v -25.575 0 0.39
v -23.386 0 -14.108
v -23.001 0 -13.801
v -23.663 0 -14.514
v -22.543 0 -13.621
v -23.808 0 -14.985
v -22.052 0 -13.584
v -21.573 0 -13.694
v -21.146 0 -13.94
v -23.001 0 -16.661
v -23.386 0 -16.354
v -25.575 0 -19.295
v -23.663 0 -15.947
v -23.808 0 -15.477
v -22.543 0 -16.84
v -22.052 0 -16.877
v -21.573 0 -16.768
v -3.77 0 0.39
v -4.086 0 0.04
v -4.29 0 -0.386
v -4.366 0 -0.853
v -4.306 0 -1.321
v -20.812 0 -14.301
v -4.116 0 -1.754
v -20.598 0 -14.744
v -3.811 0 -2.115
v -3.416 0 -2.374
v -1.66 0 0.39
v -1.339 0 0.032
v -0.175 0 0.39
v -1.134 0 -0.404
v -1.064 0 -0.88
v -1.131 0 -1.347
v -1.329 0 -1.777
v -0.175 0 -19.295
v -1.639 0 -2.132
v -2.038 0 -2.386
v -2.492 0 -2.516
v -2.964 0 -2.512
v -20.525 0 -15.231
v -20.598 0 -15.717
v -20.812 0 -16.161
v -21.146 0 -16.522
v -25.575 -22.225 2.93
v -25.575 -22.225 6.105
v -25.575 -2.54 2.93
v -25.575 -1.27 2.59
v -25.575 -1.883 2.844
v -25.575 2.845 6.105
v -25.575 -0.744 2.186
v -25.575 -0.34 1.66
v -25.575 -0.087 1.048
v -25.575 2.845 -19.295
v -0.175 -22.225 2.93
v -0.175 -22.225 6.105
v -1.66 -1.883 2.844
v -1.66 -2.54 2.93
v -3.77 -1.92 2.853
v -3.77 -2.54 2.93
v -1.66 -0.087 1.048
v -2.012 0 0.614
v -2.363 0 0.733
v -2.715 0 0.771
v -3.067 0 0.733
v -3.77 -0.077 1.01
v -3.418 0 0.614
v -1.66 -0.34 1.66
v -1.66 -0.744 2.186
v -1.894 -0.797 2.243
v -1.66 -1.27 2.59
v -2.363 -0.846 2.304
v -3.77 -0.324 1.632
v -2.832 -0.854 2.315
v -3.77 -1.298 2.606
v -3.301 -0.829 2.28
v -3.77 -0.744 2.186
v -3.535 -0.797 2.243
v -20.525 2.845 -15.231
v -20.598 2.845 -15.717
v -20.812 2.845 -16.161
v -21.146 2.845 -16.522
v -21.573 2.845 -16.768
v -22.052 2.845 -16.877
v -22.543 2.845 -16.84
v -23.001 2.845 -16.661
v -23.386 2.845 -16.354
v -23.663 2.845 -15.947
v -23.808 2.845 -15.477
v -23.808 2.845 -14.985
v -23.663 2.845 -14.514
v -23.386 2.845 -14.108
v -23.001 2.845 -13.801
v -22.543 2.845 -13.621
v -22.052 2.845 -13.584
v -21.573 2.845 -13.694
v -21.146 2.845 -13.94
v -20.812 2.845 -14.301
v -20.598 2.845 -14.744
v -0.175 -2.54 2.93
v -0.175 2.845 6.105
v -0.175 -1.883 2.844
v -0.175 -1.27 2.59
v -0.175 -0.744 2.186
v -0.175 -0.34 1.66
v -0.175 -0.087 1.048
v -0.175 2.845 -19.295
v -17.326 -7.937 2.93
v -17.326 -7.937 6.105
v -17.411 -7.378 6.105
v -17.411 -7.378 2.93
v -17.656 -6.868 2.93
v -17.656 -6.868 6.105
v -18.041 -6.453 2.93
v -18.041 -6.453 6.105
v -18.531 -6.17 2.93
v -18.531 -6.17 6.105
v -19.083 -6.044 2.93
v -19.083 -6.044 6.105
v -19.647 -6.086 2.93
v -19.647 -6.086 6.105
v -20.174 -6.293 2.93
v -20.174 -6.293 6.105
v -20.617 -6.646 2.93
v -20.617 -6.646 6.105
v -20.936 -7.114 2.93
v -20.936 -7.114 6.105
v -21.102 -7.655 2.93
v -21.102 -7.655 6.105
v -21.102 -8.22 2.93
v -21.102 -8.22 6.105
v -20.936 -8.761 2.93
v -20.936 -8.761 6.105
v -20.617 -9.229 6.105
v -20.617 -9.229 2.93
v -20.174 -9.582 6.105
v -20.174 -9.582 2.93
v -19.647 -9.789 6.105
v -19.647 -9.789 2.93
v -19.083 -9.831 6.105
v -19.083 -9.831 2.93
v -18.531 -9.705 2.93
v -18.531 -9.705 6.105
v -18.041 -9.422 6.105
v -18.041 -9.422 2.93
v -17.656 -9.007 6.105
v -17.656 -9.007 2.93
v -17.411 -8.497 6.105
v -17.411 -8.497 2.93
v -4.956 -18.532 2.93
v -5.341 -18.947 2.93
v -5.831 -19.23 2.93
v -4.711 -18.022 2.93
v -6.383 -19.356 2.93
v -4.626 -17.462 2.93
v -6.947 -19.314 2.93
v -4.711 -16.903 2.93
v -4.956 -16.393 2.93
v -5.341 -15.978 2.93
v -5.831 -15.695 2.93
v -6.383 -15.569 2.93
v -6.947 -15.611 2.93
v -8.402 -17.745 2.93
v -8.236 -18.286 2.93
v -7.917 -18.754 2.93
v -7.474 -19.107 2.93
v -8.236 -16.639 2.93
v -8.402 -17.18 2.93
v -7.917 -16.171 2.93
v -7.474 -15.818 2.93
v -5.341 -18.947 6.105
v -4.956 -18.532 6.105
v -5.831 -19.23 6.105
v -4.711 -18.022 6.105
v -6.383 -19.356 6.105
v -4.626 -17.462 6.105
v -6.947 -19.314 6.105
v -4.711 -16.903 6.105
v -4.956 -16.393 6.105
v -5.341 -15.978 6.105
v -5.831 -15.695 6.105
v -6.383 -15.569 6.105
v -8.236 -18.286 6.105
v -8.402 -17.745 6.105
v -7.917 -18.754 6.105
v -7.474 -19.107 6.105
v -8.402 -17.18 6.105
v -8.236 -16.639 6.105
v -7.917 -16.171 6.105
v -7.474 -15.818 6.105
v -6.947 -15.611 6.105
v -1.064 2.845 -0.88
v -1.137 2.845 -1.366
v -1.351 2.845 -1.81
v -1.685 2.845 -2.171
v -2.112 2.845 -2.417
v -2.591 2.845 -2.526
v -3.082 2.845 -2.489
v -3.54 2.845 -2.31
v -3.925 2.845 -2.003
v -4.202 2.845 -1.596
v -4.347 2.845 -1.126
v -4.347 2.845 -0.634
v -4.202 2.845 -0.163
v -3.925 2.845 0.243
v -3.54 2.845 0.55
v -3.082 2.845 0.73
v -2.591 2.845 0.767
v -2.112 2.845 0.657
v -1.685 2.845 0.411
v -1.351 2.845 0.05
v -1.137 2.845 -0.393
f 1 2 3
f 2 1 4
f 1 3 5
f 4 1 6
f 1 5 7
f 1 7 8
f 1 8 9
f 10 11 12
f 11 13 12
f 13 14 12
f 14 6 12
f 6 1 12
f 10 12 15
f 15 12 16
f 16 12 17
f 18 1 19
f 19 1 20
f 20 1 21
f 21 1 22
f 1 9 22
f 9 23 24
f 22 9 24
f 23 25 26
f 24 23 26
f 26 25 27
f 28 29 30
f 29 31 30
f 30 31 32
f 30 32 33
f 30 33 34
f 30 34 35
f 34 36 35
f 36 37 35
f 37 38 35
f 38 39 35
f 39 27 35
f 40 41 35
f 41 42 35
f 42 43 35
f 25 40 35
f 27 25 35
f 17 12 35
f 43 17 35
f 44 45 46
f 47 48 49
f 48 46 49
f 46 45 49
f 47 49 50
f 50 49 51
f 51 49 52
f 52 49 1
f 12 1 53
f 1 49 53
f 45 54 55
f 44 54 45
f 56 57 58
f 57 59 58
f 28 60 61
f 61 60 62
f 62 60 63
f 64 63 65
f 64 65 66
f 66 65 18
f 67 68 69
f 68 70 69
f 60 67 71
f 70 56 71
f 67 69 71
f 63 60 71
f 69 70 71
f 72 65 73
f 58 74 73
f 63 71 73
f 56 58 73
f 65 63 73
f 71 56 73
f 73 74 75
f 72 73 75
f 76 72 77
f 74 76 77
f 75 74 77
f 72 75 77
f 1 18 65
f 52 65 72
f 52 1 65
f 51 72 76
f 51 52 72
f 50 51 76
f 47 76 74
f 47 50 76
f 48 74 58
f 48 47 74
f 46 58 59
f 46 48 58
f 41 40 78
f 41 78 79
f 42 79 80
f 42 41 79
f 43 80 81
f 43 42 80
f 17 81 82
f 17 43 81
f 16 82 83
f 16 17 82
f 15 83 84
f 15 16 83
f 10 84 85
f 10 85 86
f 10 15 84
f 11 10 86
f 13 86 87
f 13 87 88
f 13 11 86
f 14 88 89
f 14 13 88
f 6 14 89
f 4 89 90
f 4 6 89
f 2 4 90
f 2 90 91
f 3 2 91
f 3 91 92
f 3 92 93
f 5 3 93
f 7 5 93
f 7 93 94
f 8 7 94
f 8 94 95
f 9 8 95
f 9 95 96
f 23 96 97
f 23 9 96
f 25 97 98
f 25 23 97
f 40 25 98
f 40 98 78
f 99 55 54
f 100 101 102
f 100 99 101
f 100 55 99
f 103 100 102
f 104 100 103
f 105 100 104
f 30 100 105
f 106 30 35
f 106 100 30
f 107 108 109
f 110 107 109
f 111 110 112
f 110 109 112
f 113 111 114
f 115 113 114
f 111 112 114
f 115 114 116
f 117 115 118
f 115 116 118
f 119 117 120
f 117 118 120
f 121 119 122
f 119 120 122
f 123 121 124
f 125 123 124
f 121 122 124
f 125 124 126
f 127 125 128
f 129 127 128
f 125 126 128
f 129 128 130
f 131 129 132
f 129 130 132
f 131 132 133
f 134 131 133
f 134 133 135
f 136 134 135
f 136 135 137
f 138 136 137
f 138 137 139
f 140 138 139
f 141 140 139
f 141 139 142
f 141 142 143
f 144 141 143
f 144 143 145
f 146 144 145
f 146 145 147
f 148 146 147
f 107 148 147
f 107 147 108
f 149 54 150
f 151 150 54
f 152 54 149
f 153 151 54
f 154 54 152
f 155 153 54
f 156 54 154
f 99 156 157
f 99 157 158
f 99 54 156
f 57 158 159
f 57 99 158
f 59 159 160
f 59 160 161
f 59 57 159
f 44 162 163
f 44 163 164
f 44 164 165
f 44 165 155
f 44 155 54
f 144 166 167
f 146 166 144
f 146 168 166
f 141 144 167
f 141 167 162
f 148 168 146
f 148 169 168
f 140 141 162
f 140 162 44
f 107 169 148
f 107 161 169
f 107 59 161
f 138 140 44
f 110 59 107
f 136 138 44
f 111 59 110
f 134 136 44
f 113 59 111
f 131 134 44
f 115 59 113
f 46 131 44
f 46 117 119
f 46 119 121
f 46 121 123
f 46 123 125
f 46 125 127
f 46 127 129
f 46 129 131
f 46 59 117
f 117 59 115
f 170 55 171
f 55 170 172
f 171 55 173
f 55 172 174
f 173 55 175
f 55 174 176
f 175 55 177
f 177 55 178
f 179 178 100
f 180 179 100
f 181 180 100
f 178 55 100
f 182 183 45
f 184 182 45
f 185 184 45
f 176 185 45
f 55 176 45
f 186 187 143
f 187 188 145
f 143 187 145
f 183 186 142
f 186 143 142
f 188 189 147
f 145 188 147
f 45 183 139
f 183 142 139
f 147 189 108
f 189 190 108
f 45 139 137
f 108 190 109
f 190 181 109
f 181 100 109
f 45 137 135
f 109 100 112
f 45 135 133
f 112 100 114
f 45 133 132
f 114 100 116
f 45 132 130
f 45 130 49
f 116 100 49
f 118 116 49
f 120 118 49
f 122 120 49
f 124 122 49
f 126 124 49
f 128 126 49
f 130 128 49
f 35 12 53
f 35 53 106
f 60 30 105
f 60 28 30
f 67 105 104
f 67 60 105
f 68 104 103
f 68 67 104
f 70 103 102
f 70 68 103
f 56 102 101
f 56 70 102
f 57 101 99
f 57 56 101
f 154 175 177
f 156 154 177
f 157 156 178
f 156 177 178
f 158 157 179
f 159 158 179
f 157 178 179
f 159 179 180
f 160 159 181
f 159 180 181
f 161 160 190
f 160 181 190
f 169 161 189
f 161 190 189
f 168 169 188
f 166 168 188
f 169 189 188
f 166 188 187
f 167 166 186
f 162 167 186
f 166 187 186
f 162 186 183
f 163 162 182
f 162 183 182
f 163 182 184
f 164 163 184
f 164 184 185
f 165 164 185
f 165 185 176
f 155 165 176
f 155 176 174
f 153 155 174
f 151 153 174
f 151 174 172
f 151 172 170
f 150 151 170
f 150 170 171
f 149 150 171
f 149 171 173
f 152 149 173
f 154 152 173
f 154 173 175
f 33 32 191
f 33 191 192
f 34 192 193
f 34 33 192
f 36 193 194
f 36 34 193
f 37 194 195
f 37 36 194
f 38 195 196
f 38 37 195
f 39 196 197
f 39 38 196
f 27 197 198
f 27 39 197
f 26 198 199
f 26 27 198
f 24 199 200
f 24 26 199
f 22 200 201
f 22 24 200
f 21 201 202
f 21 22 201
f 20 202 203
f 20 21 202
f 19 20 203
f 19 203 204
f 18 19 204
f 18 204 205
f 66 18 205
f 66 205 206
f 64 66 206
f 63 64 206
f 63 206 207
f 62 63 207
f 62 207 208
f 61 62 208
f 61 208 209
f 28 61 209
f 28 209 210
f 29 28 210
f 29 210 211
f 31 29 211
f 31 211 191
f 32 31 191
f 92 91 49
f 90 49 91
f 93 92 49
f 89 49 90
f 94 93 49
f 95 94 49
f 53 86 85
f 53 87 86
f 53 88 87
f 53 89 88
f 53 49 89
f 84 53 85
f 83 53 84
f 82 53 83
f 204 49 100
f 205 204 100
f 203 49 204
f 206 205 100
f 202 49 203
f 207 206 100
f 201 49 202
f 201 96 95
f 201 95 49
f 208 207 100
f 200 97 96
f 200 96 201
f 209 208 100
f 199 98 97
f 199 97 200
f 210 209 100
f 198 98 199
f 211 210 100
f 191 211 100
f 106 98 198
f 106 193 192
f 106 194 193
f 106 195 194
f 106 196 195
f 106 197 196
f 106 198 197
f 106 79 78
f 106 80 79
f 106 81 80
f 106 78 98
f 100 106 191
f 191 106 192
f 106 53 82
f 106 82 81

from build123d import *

# Parameters (mm, degrees)
SKETCH2_W                 = 25.4
SKETCH2_H                 = 25.4
SKETCH2_R                 = 1.651
BOSS_EXTRUDE1_DEPTH       = 2.8448
SKETCH3_W                 = 25.4
SKETCH3_H                 = 3.175
BOSS_EXTRUDE2_DEPTH       = 22.225
FILLET1_R                 = 2.54
F_6_CLEARANCE_HOLE1_D     = 3.7973
F_6_CLEARANCE_HOLE1_DEPTH = 12.7
F_6_CLEARANCE_HOLE1_TIP   = 1.140824014


with BuildPart() as part:
    # Sketch2 → Boss-Extrude1 (new body)
    with BuildSketch(Plane(origin=(0, 0, 0), x_dir=(1, 0, 0), z_dir=(0, 1, 0))):
        with Locations((-12.874879011, 6.594776819)):
            Rectangle(SKETCH2_W, SKETCH2_H)
        with Locations((-22.175738421, 15.230776819)):
            Circle(SKETCH2_R, mode=Mode.SUBTRACT)
        with Locations((-2.714879011, 0.879776819)):
            Circle(SKETCH2_R, mode=Mode.SUBTRACT)
    extrude(amount=BOSS_EXTRUDE1_DEPTH)

    # Sketch3 → Boss-Extrude2 (add)
    with BuildSketch(Plane(origin=(0, 0, 0), x_dir=(-1, 0, 0), z_dir=(0, -1, 0))):
        with Locations((12.874879011, -4.517723181)):
            Rectangle(SKETCH3_W, SKETCH3_H)
    extrude(amount=BOSS_EXTRUDE2_DEPTH)

    # Fillet1
    fillet1_edges = [part.edges().sort_by_distance(p)[0] for p in [
        (-12.874879011, 0, 2.930223181),
    ]]
    fillet(fillet1_edges, radius=FILLET1_R)

    # #6 Clearance Hole1
    with Locations(Plane(origin=(-6.524879011, -17.4625, 2.930223181), x_dir=(-1, 0, 0), z_dir=(0, 0, -1))):
        with Locations((0, 0), (12.7, 9.525)):
            Hole(F_6_CLEARANCE_HOLE1_D / 2, depth=F_6_CLEARANCE_HOLE1_DEPTH)
            with Locations((0, 0, -(F_6_CLEARANCE_HOLE1_DEPTH + F_6_CLEARANCE_HOLE1_TIP / 2))):  # 118° drill point
                Cone(0, F_6_CLEARANCE_HOLE1_D / 2, F_6_CLEARANCE_HOLE1_TIP, mode=Mode.SUBTRACT)


solid = part.part
